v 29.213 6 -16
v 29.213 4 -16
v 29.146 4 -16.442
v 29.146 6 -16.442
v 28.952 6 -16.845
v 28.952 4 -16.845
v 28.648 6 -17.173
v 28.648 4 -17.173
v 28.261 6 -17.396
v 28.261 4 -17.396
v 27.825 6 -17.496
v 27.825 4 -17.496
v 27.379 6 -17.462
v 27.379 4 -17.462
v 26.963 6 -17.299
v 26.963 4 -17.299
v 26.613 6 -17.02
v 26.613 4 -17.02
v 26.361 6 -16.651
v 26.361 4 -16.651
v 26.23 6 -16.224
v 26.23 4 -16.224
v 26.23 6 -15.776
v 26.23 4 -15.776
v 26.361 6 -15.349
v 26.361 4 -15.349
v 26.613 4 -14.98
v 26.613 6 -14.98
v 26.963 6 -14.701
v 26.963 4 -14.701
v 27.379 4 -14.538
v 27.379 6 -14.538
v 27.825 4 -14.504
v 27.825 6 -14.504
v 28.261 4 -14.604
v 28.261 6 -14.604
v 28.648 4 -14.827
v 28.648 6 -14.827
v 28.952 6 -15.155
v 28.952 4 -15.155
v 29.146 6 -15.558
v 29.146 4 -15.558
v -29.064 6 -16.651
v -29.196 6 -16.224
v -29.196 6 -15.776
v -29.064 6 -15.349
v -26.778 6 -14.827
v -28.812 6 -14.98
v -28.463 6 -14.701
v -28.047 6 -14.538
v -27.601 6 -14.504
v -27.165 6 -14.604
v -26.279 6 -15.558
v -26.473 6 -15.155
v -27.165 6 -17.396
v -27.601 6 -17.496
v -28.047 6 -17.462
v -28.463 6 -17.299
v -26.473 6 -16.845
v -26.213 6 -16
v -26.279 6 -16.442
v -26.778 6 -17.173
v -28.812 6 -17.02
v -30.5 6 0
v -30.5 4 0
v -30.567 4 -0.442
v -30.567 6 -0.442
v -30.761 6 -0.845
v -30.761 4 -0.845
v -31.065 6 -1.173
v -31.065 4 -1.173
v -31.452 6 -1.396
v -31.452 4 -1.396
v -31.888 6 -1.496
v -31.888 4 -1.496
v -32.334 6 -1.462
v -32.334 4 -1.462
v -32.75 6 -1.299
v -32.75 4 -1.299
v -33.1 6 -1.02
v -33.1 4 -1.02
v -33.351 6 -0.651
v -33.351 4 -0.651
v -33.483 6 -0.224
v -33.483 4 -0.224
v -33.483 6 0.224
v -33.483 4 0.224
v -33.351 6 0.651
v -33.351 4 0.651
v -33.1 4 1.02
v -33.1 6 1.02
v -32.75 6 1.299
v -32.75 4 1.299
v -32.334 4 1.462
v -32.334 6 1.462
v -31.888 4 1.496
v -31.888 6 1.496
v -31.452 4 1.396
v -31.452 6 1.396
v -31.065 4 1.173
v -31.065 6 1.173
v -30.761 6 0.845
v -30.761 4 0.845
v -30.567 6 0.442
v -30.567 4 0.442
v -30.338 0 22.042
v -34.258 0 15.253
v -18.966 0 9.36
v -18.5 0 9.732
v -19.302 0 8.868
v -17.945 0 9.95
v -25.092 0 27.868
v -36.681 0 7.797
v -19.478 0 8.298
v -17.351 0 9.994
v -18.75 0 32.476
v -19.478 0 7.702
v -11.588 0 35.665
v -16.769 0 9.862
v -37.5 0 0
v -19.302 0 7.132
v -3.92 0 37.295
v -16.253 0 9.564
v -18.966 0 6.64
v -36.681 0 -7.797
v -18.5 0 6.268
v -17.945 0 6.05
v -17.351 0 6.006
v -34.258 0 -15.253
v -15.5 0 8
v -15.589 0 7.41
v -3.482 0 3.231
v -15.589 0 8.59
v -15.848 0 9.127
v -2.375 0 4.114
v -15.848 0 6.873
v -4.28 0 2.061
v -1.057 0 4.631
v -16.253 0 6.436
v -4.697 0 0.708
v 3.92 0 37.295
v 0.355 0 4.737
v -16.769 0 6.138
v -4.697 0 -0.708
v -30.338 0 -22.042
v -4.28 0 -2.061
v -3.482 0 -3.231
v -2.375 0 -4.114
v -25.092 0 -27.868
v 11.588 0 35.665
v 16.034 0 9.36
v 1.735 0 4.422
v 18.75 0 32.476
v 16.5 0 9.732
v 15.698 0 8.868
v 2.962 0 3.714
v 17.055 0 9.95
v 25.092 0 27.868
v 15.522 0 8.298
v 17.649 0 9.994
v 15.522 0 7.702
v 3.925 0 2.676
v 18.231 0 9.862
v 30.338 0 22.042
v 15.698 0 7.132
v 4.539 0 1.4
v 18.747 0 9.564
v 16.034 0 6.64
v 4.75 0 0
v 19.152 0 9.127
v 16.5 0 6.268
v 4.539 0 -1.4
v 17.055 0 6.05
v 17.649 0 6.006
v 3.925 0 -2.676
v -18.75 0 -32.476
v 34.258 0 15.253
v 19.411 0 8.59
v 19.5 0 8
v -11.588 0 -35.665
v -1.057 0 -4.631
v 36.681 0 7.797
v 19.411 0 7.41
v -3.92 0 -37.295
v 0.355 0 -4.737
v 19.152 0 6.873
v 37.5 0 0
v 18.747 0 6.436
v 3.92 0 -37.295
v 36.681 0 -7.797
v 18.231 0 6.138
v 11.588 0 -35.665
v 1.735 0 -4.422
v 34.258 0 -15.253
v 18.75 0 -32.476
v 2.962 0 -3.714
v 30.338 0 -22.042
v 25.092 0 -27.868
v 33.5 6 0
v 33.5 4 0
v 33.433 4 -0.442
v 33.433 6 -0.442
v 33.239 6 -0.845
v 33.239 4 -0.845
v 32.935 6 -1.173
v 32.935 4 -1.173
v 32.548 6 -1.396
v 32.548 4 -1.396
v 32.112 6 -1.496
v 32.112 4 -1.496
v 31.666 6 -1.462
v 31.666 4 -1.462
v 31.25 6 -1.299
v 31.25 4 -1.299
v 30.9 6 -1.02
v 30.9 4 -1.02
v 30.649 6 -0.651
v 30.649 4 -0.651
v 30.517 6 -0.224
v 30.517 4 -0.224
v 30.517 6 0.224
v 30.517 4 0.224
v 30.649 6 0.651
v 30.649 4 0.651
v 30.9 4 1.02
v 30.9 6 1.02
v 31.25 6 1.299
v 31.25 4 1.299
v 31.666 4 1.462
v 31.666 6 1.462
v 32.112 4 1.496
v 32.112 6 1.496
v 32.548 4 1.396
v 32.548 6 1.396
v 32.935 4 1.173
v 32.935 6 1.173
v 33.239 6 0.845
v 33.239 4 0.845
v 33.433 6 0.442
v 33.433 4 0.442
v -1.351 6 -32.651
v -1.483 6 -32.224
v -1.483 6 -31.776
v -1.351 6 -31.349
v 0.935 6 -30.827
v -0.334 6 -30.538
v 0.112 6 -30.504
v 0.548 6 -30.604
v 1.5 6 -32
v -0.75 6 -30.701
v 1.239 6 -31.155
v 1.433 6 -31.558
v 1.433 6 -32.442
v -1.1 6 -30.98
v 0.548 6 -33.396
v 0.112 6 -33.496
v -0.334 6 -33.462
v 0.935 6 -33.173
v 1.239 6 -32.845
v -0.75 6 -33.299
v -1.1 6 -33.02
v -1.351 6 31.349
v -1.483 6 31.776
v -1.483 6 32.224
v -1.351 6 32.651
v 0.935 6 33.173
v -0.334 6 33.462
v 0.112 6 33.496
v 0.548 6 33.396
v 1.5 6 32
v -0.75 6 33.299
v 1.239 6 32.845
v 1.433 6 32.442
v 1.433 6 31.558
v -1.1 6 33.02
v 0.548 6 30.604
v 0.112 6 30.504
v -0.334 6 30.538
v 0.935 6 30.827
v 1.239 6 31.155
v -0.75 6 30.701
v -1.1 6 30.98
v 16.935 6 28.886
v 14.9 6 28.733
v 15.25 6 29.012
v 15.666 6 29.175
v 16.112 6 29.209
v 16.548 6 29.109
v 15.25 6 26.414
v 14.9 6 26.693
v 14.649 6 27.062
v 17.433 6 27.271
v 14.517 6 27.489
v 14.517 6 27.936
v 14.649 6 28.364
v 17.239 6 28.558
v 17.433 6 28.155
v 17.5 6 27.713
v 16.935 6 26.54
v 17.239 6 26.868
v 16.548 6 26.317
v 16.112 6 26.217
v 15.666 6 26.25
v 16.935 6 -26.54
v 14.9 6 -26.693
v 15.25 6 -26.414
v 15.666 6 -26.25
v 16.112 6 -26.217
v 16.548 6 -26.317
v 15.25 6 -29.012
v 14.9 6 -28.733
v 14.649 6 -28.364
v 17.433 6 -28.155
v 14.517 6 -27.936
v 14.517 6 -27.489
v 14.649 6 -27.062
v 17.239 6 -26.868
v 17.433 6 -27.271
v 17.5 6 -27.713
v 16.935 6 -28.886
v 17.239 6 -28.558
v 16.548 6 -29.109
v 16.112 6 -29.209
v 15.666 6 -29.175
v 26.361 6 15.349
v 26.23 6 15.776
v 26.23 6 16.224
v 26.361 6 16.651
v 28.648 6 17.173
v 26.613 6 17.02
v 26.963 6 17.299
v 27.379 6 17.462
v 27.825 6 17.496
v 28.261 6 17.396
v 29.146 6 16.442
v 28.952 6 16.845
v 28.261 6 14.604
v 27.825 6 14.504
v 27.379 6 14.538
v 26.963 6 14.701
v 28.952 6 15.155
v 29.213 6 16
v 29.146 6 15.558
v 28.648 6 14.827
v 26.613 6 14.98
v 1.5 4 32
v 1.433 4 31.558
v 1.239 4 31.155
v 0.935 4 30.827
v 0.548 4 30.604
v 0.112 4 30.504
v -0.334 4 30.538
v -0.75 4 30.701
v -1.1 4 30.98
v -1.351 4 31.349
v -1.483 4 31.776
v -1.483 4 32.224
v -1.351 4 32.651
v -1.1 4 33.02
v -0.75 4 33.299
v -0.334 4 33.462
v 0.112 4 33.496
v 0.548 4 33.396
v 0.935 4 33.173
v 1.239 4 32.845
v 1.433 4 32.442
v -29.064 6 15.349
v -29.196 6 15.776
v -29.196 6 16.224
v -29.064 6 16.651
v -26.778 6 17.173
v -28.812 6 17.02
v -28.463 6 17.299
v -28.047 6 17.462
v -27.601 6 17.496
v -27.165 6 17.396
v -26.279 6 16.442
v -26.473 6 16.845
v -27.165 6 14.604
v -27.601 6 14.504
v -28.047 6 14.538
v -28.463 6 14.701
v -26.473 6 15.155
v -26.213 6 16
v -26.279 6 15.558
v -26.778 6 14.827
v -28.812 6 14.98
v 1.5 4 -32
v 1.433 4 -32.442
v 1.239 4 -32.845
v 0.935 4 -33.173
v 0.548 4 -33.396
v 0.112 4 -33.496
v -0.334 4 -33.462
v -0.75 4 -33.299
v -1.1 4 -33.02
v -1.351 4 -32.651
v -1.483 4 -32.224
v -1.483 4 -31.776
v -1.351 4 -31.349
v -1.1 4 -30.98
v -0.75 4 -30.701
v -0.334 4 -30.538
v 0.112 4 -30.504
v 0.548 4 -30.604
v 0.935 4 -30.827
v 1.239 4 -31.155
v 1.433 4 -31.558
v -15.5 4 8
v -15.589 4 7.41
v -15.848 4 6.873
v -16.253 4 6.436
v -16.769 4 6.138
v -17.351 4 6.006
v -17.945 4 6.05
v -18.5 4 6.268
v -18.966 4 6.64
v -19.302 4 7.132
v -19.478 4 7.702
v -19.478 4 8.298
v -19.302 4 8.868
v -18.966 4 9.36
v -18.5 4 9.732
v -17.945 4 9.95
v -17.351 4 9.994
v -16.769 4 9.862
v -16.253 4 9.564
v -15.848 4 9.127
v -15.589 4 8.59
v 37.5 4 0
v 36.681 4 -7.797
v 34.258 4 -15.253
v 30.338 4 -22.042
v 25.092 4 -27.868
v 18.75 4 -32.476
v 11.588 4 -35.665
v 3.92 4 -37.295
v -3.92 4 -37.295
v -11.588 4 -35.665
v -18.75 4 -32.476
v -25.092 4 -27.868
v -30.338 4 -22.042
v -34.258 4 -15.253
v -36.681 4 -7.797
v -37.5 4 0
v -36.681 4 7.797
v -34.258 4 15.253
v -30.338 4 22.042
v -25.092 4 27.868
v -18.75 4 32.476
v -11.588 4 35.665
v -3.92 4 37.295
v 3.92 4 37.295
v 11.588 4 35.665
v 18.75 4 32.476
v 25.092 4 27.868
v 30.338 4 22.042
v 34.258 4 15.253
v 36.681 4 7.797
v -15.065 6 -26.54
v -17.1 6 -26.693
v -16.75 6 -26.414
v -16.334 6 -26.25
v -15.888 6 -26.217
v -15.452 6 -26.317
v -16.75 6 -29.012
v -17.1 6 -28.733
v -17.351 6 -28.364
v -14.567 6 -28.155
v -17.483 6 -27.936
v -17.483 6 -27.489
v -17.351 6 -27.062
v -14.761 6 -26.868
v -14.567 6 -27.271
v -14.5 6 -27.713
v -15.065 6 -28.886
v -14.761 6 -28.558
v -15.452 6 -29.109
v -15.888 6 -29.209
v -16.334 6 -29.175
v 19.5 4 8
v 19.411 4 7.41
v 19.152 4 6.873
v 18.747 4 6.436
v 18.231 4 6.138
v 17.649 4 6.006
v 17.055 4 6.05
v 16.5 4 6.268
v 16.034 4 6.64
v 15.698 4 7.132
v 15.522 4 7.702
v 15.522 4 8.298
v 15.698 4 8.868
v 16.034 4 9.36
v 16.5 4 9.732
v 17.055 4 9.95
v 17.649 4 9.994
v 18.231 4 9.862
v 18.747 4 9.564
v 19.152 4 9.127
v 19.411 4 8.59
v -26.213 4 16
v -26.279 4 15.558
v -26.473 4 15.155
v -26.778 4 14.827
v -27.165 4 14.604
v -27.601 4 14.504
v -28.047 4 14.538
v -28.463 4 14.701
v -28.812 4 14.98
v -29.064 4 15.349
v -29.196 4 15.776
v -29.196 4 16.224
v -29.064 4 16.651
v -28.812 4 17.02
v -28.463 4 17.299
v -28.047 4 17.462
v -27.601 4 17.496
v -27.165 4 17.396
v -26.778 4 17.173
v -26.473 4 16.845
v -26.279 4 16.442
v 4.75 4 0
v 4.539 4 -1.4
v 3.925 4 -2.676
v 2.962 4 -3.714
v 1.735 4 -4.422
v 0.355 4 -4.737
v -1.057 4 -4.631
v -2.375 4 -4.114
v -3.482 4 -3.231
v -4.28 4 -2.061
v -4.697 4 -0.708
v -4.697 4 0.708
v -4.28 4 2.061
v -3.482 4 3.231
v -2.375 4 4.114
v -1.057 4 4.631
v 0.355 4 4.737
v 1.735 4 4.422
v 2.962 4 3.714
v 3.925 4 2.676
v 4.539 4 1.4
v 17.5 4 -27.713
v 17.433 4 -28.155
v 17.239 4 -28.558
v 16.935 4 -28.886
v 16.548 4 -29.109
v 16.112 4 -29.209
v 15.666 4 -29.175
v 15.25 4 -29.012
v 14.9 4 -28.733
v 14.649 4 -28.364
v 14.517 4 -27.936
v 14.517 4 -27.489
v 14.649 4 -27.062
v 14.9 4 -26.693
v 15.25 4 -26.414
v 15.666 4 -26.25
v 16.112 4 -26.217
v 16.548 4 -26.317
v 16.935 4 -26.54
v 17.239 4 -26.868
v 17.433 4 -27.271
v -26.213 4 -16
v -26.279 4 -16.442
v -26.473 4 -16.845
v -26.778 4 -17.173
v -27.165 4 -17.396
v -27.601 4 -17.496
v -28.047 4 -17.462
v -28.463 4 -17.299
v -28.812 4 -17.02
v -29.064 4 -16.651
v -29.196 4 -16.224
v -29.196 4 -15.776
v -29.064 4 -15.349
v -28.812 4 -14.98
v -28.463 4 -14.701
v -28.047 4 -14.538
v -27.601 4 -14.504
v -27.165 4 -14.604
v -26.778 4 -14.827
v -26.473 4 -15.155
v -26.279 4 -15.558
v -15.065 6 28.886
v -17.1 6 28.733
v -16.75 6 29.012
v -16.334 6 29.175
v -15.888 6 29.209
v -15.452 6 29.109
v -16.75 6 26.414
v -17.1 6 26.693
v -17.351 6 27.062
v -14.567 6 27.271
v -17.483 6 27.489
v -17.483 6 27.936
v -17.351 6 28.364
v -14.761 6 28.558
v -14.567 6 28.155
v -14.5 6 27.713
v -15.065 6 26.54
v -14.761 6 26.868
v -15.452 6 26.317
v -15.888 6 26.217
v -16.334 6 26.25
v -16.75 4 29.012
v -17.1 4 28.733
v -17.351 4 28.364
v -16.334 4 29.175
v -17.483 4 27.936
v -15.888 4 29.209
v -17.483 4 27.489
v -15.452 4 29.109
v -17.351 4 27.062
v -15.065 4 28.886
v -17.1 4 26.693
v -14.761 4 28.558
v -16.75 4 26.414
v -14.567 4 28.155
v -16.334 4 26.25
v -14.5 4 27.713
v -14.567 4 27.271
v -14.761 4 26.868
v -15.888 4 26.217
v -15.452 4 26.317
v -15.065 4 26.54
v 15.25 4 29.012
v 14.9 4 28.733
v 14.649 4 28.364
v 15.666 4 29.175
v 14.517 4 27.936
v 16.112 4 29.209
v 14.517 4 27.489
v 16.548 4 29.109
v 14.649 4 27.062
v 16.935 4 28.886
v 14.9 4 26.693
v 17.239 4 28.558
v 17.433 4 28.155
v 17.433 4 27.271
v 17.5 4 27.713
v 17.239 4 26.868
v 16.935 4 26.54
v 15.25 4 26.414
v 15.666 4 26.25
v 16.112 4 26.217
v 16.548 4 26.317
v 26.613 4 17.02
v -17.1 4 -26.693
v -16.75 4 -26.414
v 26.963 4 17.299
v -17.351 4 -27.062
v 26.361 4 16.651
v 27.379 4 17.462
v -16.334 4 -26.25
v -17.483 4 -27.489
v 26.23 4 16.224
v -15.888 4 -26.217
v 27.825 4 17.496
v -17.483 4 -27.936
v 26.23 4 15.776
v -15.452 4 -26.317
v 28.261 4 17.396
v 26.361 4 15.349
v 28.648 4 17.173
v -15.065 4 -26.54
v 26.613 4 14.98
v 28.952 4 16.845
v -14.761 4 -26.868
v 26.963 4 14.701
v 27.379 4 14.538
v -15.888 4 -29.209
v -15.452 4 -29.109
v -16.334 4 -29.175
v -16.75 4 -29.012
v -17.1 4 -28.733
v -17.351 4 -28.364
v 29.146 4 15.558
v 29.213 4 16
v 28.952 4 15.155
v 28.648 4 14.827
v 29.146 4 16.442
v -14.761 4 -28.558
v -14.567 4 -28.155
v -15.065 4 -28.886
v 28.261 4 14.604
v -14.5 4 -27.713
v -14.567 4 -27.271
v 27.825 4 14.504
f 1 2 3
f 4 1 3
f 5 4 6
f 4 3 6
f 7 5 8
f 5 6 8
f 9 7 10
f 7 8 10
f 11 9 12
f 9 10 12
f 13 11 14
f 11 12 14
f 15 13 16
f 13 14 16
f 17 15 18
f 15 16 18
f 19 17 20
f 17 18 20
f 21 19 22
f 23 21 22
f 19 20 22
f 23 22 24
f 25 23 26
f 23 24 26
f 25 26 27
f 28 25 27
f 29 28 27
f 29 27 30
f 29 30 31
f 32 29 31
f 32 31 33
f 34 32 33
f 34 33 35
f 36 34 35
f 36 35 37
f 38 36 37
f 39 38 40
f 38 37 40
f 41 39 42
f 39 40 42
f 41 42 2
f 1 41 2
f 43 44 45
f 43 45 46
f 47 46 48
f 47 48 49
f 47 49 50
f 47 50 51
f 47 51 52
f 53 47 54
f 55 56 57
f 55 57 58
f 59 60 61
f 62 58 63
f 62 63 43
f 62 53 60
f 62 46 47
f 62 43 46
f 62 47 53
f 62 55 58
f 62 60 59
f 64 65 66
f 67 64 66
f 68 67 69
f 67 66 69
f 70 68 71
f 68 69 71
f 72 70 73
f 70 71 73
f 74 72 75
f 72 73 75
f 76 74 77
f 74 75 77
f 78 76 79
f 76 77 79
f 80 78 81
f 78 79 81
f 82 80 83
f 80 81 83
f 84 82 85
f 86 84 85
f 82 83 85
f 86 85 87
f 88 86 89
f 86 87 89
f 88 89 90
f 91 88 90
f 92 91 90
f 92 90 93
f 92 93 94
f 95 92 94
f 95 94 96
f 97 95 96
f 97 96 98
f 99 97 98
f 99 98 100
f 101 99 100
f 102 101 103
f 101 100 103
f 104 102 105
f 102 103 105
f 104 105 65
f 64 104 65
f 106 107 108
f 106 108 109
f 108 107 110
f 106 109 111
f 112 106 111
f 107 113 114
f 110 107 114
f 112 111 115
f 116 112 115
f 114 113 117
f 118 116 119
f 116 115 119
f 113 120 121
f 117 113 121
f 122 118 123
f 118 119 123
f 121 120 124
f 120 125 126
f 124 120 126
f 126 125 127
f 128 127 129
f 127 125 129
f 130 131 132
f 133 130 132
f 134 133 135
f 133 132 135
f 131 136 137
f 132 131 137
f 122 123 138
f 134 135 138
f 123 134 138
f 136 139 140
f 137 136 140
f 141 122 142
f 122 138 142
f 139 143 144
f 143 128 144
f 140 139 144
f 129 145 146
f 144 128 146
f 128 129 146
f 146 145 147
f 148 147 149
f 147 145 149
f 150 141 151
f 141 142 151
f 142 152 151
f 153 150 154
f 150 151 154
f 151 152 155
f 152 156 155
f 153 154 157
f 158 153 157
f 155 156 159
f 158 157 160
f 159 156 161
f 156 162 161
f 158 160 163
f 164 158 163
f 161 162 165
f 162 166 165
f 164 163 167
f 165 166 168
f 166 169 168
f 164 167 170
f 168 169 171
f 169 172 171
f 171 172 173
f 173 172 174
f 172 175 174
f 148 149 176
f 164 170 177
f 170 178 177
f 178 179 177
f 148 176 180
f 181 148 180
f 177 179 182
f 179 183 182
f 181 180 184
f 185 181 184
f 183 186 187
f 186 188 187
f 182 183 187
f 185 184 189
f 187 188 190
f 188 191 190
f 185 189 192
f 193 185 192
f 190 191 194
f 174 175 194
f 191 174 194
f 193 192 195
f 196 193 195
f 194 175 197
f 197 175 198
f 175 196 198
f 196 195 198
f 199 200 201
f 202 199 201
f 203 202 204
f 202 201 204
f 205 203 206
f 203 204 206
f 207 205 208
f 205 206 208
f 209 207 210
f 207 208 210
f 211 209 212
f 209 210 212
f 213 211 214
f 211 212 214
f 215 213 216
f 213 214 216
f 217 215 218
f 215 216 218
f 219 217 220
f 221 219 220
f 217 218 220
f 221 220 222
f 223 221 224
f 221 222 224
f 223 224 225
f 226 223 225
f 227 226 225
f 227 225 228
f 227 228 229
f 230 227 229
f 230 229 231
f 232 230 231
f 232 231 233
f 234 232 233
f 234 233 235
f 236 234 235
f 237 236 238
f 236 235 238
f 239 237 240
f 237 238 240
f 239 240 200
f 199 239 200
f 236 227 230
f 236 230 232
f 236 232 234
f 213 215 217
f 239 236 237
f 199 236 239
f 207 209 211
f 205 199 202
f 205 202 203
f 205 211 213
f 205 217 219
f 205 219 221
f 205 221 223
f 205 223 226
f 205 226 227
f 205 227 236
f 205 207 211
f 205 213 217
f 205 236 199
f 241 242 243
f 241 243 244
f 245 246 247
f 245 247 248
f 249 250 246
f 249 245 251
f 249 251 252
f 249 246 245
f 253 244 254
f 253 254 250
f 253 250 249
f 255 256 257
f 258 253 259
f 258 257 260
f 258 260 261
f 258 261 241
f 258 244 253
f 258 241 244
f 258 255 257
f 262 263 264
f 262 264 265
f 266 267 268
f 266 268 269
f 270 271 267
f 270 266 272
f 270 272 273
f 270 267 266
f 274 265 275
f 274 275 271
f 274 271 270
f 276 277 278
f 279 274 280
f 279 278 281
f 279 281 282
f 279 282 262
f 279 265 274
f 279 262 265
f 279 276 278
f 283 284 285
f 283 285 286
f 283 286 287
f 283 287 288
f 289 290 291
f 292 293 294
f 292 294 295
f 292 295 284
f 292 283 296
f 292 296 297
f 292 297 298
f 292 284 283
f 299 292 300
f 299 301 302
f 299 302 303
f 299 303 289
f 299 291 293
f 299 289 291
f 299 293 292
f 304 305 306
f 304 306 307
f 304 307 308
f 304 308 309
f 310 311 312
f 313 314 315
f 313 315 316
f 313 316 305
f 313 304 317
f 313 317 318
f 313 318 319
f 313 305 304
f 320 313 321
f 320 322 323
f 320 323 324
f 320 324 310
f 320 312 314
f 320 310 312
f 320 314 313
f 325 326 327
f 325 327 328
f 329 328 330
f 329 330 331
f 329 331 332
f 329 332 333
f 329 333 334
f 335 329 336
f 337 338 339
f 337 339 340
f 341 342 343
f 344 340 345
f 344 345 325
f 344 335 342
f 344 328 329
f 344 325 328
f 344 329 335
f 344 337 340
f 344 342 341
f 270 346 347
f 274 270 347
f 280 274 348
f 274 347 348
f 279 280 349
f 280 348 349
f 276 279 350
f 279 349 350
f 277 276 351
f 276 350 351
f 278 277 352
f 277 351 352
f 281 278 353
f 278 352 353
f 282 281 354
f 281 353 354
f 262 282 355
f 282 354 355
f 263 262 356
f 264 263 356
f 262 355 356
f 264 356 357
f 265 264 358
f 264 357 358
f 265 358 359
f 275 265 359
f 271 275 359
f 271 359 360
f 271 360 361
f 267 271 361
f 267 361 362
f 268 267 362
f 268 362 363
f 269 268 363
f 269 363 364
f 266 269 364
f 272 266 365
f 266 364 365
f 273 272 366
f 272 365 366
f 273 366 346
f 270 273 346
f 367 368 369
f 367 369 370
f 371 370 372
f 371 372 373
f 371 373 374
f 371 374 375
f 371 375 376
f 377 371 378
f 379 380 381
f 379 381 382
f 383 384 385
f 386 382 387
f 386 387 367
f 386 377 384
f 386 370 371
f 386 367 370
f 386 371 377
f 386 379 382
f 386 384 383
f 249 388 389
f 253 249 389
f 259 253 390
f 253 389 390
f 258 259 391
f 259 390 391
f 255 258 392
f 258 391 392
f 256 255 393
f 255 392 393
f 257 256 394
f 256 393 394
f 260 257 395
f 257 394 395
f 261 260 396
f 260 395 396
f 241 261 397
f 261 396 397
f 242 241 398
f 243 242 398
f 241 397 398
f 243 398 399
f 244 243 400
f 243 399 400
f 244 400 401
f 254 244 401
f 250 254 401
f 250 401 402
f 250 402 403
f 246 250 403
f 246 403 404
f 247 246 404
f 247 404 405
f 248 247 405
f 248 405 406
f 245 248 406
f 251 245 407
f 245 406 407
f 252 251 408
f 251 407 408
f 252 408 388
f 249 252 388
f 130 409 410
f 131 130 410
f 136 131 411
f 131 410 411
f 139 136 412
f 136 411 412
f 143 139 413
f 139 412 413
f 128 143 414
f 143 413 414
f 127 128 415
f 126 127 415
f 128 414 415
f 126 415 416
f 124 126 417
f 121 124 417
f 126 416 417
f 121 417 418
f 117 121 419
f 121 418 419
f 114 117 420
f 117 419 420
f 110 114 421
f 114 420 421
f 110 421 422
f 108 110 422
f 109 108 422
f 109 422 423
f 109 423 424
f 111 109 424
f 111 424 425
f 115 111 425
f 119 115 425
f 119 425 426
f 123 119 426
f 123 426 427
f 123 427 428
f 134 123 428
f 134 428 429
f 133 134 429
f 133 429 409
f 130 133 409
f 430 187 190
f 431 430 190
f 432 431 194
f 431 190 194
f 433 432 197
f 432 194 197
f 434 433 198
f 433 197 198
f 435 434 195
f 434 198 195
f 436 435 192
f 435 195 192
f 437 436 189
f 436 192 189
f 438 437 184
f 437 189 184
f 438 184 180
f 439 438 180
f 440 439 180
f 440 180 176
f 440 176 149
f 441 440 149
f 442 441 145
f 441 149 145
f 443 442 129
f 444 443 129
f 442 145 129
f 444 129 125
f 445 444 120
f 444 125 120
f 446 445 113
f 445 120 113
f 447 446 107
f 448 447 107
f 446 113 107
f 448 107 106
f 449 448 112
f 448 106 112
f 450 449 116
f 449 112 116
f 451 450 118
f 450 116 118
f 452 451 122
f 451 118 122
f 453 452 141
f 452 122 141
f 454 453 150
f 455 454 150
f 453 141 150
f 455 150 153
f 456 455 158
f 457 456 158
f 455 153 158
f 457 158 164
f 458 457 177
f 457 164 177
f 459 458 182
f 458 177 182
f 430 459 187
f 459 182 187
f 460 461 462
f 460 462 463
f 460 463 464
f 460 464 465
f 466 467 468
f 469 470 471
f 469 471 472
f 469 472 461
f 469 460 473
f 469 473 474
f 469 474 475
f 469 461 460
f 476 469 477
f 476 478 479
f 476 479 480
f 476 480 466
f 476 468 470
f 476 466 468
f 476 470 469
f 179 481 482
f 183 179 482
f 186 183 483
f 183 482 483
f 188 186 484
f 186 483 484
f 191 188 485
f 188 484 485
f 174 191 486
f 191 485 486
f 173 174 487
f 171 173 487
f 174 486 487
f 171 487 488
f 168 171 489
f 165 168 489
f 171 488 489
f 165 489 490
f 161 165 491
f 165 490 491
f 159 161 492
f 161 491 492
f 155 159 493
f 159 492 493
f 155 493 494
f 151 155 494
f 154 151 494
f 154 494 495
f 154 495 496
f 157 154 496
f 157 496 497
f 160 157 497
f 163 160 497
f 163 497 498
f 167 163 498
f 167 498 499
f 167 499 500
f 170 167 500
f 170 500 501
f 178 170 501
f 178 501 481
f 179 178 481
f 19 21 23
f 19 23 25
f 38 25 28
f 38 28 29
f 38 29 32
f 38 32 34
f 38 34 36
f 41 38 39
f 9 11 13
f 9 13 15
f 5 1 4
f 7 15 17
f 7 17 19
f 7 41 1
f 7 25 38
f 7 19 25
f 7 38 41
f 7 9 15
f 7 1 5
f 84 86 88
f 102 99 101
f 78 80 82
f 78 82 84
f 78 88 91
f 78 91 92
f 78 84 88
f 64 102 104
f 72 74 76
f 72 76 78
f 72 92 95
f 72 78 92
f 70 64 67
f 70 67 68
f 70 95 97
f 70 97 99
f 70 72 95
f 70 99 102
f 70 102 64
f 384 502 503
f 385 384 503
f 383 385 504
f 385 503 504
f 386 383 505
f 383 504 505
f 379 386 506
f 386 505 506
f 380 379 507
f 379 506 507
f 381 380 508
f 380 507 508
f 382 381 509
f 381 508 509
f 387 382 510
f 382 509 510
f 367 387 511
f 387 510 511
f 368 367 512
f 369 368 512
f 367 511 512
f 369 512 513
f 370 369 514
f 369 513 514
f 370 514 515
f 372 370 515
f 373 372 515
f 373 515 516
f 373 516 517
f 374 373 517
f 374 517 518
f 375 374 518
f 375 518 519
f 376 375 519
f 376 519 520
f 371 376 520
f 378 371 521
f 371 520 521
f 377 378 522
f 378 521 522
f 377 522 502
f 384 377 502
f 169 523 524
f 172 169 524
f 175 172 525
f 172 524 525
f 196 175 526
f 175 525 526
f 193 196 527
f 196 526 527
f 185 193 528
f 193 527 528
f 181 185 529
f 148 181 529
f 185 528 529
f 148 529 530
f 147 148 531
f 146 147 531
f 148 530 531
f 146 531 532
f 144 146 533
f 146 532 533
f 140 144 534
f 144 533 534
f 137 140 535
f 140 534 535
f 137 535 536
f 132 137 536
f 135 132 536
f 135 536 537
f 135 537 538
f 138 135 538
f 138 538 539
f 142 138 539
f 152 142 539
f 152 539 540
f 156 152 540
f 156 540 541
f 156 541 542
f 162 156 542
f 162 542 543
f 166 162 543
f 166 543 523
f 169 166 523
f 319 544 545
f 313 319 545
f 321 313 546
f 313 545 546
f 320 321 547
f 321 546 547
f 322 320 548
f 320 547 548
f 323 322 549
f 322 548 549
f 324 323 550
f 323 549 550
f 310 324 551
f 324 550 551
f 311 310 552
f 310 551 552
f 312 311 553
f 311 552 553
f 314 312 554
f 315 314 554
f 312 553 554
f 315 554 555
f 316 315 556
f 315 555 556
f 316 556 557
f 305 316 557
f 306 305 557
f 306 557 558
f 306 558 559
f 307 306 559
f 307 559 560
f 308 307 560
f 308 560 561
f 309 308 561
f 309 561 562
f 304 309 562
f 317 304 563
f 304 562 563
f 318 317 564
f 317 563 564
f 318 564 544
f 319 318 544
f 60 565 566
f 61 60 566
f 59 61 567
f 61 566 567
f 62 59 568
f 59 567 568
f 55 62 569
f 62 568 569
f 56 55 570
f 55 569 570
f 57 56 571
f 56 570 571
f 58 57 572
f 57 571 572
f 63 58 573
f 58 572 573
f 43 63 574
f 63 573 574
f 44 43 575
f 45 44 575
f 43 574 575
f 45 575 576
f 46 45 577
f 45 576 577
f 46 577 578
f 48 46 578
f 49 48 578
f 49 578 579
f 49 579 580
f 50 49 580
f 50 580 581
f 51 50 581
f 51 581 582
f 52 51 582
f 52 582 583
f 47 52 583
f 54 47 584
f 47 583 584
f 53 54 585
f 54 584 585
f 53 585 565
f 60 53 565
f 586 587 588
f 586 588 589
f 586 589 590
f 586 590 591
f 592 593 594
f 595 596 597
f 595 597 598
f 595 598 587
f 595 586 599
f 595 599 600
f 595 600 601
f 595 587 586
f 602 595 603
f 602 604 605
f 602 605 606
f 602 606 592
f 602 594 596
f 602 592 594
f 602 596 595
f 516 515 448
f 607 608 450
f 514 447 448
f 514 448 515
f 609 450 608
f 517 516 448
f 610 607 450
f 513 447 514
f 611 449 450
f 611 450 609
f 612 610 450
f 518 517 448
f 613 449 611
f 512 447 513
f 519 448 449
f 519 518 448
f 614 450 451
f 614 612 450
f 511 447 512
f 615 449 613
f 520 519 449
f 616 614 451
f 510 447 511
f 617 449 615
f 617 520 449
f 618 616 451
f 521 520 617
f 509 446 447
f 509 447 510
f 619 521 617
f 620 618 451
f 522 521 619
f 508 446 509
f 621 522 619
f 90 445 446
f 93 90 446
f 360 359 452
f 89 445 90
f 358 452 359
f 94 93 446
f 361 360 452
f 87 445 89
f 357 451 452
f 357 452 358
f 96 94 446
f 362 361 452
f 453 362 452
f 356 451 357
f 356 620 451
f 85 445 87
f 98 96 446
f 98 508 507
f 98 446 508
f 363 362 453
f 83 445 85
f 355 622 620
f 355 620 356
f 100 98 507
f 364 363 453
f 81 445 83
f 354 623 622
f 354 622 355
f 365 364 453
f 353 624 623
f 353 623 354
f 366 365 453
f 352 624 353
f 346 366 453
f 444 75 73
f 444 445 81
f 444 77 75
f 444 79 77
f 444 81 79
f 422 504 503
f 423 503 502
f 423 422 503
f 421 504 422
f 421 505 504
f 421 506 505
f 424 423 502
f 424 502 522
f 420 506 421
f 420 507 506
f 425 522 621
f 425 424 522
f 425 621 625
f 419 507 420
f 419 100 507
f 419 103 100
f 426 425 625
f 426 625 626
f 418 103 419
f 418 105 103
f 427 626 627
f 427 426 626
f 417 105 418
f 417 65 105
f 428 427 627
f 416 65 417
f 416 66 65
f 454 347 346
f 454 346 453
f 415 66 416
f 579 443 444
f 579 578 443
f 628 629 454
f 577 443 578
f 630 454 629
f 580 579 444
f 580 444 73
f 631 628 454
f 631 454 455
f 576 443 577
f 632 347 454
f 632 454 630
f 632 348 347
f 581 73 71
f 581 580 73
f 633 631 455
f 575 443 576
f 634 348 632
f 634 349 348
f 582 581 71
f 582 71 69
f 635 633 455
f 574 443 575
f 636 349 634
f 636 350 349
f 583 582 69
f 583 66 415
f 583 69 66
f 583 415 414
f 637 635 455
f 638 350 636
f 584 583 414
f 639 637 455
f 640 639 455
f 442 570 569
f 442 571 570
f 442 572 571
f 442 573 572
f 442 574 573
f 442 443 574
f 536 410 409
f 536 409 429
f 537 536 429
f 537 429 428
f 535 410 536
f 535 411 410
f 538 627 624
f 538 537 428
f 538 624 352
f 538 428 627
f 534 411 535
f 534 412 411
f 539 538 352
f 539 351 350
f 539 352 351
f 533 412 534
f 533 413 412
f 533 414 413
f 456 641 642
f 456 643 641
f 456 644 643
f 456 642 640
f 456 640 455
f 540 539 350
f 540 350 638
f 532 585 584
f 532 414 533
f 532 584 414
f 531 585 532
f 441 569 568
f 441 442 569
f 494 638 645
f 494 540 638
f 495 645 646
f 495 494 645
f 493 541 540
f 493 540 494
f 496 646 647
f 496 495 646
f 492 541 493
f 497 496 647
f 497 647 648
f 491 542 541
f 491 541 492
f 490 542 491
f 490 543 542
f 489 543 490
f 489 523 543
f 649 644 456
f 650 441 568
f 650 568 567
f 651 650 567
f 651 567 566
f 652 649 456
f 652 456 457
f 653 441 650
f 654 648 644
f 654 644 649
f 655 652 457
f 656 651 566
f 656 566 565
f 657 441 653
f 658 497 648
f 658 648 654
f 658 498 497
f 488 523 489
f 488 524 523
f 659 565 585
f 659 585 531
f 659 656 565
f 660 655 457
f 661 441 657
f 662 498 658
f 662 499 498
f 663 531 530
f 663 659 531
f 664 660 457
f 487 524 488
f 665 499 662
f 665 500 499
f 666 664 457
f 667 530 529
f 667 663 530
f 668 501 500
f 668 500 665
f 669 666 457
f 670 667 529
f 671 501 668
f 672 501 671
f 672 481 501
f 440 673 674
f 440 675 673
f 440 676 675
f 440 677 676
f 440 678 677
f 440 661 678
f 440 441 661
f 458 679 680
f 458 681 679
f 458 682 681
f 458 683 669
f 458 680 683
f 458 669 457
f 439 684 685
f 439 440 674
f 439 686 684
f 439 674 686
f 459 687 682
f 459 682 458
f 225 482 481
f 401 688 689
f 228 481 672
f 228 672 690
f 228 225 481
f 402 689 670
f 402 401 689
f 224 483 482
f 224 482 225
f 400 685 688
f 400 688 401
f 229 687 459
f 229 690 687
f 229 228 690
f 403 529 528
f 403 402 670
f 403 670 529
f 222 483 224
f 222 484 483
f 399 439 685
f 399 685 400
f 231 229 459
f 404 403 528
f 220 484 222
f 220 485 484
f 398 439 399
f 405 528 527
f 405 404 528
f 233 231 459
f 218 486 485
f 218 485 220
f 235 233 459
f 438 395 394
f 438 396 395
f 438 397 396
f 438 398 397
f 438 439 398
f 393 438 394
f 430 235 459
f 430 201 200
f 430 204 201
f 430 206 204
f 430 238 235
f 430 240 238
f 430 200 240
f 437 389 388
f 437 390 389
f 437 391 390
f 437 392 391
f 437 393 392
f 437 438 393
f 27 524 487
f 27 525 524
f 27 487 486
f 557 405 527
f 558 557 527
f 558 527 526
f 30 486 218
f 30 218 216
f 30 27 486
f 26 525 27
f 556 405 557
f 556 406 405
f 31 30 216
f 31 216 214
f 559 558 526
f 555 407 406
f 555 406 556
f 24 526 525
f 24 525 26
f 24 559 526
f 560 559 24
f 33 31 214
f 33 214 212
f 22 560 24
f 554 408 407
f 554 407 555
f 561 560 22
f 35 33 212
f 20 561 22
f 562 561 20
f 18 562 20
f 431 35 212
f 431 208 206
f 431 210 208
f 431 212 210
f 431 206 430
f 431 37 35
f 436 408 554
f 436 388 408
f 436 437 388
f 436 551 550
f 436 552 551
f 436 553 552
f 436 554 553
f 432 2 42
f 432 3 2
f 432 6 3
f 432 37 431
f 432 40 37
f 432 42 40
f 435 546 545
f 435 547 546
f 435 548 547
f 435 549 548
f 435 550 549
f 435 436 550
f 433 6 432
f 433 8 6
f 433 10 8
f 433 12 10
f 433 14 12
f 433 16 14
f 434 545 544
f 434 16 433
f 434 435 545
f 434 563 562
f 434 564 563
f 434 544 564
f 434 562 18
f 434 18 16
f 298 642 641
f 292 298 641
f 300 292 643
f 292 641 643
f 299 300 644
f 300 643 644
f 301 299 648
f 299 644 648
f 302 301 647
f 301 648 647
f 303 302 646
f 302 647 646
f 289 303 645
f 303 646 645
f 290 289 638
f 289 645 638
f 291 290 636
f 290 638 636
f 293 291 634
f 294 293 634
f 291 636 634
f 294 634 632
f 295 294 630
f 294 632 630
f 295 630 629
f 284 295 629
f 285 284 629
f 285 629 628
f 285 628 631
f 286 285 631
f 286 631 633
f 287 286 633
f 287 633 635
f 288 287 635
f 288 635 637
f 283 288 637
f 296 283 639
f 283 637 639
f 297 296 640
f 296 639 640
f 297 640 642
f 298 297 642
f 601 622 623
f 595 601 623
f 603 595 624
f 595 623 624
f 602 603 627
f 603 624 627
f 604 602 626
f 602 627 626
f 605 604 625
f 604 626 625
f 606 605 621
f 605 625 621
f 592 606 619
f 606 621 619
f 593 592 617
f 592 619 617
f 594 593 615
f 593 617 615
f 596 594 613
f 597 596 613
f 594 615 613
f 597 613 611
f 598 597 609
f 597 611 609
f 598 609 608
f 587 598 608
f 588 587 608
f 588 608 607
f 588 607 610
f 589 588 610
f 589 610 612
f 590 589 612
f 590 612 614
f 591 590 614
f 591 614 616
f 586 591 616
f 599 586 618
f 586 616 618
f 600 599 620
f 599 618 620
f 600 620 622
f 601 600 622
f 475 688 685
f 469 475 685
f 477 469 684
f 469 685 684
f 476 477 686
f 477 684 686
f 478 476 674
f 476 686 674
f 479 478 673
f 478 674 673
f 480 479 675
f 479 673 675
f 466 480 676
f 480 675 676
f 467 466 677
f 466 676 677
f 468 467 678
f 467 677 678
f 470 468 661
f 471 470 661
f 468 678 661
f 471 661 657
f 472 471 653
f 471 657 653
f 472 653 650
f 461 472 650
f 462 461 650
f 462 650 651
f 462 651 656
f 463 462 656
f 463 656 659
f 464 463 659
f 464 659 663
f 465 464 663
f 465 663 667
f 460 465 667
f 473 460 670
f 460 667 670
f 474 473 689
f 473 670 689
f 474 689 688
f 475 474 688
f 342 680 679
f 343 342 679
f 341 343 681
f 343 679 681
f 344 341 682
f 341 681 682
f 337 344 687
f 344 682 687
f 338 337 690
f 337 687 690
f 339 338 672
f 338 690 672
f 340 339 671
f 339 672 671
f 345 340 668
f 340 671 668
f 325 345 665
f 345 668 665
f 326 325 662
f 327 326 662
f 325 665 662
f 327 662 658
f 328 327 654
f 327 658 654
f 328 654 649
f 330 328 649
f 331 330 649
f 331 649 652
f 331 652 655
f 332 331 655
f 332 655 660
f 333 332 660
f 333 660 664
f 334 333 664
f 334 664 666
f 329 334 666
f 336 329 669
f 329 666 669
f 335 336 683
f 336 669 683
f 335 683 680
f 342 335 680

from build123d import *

# Parameters (mm, degrees)
SKETCH1_R           = 37.5
BOSS_EXTRUDE1_DEPTH = 4
SKETCH4_R           = 1.5
BOSS_EXTRUDE2_DEPTH = 2
SKETCH5_R           = 2
CUT_EXTRUDE2_DEPTH  = 10
SKETCH6_R           = 4.75
CUT_EXTRUDE3_DEPTH  = 42


with BuildPart() as part:
    # Sketch1 → Boss-Extrude1 (new body)
    with BuildSketch(Plane(origin=(0, 0, 0), x_dir=(1, 0, 0), z_dir=(0, 1, 0))):
        Circle(SKETCH1_R)
    extrude(amount=BOSS_EXTRUDE1_DEPTH)

    # Sketch4 → Boss-Extrude2 (add)
    with BuildSketch(Plane(origin=(0, 4, 0), x_dir=(1, 0, 0), z_dir=(0, 1, 0))):
        with Locations((0, 32)):
            Circle(SKETCH4_R)
        with Locations((16, 27.712812921)):
            Circle(SKETCH4_R)
        with Locations((27.712812921, 16)):
            Circle(SKETCH4_R)
        with Locations((32, 0)):
            Circle(SKETCH4_R)
        with Locations((27.712812921, -16)):
            Circle(SKETCH4_R)
        with Locations((16, -27.712812921)):
            Circle(SKETCH4_R)
        with Locations((0, -32)):
            Circle(SKETCH4_R)
        with Locations((-16, -27.712812921)):
            Circle(SKETCH4_R)
        with Locations((-27.712812921, -16)):
            Circle(SKETCH4_R)
        with Locations((-32, 0)):
            Circle(SKETCH4_R)
        with Locations((-27.712812921, 16)):
            Circle(SKETCH4_R)
        with Locations((-16, 27.712812921)):
            Circle(SKETCH4_R)
    extrude(amount=BOSS_EXTRUDE2_DEPTH)

    # Sketch5 → Cut-Extrude2 (cut)
    with BuildSketch(Plane(origin=(0, 4, 0), x_dir=(1, 0, 0), z_dir=(0, 1, 0))):
        with Locations((-17.5, -8)):
            Circle(SKETCH5_R)
        with Locations((17.5, -8)):
            Circle(SKETCH5_R)
    extrude(amount=-CUT_EXTRUDE2_DEPTH, mode=Mode.SUBTRACT)

    # Sketch6 → Cut-Extrude3 (cut)
    with BuildSketch(Plane(origin=(0, 4, 0), x_dir=(1, 0, 0), z_dir=(0, 1, 0))):
        Circle(SKETCH6_R)
    extrude(amount=-CUT_EXTRUDE3_DEPTH, mode=Mode.SUBTRACT)


solid = part.part
